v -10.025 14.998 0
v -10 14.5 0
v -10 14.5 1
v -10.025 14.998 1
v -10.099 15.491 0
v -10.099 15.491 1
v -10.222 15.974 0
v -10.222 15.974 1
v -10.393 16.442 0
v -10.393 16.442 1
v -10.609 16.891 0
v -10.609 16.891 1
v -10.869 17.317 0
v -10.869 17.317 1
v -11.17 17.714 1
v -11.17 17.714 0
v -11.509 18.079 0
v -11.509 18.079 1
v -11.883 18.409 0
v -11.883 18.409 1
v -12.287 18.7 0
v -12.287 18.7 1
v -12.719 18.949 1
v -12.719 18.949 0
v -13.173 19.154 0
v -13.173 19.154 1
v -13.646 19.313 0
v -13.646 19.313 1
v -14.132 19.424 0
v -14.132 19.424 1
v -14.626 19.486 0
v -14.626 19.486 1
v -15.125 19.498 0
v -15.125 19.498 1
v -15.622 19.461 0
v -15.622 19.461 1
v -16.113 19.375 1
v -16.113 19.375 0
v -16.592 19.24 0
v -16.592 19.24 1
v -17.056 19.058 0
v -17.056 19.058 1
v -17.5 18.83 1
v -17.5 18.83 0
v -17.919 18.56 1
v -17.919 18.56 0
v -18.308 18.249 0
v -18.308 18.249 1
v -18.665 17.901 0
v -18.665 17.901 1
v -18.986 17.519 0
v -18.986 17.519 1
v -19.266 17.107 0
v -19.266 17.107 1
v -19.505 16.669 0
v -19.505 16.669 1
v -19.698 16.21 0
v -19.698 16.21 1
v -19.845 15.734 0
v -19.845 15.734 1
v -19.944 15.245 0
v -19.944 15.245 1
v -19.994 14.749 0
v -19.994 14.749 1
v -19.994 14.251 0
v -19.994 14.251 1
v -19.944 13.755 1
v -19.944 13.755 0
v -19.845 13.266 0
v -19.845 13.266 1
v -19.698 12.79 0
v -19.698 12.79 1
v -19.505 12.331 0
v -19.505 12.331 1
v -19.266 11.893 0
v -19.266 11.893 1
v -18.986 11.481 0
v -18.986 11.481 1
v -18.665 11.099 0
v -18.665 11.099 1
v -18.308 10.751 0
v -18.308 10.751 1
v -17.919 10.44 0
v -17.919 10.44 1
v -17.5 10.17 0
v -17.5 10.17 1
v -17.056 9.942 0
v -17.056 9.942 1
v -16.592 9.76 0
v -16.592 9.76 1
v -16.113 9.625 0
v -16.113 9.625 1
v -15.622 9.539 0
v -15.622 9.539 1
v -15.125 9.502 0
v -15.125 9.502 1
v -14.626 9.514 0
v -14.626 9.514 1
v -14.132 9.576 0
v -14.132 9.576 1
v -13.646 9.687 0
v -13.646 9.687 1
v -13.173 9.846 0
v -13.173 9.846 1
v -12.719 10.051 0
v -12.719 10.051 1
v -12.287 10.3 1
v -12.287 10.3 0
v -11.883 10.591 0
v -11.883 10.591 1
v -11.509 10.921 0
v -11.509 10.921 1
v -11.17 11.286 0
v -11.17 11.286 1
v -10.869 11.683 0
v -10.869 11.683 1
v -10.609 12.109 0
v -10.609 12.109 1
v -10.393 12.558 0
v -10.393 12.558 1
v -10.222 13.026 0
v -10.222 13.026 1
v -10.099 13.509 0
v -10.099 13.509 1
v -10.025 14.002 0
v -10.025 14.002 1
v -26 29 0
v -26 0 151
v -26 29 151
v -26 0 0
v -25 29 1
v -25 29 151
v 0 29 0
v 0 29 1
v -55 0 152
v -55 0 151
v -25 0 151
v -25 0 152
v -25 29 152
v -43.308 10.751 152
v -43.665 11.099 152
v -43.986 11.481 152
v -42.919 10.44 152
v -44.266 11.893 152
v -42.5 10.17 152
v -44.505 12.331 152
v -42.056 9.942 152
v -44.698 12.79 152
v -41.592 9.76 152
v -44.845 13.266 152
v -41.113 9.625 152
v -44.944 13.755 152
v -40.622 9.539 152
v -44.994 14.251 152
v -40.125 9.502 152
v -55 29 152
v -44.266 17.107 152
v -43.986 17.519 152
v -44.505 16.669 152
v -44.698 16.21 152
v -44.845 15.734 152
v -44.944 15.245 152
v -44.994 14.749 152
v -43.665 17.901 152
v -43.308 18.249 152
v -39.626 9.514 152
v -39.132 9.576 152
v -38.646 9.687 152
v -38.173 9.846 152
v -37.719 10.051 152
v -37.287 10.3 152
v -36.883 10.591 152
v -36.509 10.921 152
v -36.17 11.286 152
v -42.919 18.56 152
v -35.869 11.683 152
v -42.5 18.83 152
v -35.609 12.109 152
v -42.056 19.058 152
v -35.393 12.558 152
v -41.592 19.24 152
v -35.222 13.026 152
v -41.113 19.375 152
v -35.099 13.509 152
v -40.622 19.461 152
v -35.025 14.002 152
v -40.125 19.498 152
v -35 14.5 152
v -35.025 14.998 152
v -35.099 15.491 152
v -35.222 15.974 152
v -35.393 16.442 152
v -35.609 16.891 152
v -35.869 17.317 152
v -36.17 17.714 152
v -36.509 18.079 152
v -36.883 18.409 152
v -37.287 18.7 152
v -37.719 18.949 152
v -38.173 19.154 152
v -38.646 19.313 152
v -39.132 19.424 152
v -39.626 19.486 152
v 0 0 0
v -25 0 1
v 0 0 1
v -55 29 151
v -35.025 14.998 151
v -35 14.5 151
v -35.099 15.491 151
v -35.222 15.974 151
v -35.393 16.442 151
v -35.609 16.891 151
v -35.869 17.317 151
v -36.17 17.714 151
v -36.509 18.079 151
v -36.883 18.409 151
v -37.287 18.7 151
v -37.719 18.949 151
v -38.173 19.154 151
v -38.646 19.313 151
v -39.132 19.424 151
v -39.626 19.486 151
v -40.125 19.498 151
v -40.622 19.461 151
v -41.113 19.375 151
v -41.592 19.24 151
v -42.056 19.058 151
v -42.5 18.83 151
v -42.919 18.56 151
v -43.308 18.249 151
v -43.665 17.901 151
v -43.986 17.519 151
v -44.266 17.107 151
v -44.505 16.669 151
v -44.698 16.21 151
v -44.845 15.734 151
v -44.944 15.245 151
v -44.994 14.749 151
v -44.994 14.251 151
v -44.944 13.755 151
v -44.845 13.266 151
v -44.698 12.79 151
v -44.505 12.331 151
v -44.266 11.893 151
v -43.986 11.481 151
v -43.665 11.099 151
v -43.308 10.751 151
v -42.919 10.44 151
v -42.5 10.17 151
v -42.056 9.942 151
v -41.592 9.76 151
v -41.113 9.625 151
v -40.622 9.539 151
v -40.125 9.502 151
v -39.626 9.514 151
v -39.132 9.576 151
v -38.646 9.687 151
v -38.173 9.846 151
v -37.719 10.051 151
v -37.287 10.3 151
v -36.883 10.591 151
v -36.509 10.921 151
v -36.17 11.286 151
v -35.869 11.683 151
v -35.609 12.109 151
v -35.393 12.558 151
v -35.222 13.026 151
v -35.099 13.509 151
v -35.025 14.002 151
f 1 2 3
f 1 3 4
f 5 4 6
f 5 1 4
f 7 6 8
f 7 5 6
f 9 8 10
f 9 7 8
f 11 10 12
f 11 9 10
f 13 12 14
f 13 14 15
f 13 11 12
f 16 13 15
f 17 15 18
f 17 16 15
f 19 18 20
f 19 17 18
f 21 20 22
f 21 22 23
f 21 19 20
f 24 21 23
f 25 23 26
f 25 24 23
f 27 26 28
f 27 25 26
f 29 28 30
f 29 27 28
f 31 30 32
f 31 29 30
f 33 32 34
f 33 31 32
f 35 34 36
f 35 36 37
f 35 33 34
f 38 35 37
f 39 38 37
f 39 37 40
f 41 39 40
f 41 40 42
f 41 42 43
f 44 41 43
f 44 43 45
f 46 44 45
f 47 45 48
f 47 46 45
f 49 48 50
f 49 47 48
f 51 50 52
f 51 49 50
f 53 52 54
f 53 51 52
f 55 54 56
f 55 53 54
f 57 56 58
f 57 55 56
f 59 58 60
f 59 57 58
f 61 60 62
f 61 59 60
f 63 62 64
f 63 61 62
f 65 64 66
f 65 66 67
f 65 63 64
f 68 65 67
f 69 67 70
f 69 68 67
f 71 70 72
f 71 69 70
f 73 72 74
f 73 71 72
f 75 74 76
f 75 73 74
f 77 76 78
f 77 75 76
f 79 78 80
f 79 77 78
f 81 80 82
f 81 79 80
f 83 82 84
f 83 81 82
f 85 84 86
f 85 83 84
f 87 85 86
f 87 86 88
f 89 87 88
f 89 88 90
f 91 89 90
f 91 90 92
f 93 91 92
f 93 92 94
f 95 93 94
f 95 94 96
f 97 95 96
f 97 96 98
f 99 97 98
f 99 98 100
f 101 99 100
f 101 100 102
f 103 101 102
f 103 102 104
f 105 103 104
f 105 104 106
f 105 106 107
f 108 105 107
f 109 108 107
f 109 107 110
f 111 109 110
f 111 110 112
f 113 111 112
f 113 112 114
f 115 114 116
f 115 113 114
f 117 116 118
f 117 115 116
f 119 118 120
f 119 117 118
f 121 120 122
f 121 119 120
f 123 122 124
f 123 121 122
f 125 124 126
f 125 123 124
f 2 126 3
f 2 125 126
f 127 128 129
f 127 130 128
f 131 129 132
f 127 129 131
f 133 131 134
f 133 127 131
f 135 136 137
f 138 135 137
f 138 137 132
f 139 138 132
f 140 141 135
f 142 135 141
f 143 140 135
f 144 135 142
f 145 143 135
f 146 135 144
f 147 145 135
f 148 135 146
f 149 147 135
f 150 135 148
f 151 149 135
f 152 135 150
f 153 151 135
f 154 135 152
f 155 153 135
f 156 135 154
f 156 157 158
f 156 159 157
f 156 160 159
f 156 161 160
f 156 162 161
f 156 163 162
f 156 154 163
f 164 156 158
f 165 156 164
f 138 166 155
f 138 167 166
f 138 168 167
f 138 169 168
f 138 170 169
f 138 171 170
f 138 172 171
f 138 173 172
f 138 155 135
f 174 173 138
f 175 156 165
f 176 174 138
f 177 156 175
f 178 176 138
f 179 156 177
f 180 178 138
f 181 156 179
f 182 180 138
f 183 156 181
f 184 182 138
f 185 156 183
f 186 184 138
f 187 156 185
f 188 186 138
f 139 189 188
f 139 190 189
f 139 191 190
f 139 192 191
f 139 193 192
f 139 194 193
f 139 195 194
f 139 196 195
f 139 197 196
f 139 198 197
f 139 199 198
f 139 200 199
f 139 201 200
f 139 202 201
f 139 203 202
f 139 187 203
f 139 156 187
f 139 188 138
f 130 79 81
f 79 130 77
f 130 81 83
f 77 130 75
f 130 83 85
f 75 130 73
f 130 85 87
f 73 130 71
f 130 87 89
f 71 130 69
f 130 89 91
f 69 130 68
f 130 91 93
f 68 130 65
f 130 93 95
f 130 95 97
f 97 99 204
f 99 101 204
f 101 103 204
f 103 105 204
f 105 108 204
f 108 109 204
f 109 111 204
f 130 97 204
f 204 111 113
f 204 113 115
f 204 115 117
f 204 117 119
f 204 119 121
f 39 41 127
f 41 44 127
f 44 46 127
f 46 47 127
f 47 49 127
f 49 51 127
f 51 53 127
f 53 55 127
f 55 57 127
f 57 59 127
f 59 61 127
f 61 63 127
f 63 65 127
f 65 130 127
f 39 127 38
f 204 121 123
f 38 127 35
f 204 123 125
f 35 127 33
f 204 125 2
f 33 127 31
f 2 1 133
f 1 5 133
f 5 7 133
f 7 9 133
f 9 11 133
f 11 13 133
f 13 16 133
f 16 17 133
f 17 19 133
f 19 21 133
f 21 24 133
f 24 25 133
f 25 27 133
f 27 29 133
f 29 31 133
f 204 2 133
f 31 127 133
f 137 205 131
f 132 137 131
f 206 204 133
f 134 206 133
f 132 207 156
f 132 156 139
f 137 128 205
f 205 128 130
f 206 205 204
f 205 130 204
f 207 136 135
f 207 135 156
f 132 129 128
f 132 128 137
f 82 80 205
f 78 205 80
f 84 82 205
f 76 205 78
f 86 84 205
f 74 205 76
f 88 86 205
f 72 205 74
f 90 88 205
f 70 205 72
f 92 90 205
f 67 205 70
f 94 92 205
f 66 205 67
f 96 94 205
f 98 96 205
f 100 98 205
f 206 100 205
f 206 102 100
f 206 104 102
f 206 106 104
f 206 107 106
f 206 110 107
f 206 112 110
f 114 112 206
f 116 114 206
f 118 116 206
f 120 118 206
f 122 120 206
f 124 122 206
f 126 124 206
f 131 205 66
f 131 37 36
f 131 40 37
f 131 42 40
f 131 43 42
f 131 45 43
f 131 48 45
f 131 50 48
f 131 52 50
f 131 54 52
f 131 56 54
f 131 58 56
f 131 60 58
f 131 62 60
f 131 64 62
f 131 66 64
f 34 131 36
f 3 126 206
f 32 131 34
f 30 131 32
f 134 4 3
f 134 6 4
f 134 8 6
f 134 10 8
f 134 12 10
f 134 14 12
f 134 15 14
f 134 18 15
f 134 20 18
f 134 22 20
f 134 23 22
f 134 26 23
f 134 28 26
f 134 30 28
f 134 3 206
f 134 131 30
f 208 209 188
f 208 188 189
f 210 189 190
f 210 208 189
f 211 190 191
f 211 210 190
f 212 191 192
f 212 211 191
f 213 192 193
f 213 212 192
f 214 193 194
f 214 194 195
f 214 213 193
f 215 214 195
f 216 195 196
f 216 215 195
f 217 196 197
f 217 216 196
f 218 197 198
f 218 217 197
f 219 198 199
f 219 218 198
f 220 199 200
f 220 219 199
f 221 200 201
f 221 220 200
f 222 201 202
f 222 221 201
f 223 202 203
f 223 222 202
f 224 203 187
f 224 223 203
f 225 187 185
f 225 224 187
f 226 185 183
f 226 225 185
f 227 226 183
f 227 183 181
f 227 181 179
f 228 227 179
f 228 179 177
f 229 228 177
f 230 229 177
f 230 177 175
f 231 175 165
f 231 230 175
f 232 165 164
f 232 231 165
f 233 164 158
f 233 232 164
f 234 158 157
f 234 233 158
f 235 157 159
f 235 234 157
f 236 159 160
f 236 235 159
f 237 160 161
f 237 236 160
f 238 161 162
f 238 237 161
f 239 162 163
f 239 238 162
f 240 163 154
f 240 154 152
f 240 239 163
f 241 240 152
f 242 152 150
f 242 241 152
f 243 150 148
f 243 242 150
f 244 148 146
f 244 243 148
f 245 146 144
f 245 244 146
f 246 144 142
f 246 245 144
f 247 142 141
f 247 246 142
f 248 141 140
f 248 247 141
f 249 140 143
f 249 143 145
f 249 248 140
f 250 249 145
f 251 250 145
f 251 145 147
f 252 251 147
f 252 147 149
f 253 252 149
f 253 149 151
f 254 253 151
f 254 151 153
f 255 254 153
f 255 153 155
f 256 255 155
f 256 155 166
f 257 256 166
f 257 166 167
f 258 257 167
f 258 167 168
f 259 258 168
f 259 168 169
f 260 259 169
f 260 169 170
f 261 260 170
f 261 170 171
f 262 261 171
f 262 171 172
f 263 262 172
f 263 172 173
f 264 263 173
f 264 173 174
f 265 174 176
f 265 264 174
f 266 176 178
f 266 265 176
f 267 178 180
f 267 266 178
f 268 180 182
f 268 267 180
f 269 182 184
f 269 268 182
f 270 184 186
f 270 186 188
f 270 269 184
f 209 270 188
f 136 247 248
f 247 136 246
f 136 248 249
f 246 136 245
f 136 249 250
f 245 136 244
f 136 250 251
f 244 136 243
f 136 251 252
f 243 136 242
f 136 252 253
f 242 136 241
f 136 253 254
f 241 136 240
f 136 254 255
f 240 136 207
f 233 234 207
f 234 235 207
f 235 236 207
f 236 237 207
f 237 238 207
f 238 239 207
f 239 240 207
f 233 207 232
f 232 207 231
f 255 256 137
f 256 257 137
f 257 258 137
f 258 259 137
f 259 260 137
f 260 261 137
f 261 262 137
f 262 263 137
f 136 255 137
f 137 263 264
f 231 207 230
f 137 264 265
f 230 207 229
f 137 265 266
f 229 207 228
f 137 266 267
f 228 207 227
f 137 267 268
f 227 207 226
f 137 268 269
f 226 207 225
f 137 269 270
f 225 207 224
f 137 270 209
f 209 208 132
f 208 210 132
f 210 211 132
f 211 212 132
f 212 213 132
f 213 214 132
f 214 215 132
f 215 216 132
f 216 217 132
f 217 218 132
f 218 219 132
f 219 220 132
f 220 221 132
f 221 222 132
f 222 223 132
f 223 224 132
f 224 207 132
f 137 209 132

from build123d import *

# Parameters (mm, degrees)
SZKIC1_W                    = 26
SZKIC1_H                    = 29
SZKIC1_R                    = 5
DODANIE_WYCI_GNI_CIE1_DEPTH = 1
SZKIC2_W                    = 1
SZKIC2_H                    = 29
DODANIE_WYCI_GNI_CIE2_DEPTH = 150
SZKIC3_W                    = 29
SZKIC3_H                    = 29
SZKIC3_R                    = 5
SZKIC3_W_2                  = 1
DODANIE_WYCI_GNI_CIE3_DEPTH = 1


with BuildPart() as part:
    # Szkic1 → Dodanie-wyciągnięcie1 (new body)
    with BuildSketch(Plane.XY):
        with Locations((-13, 14.5)):
            Rectangle(SZKIC1_W, SZKIC1_H)
        with Locations((-15, 14.5)):
            Circle(SZKIC1_R, mode=Mode.SUBTRACT)
    extrude(amount=DODANIE_WYCI_GNI_CIE1_DEPTH)

    # Szkic2 → Dodanie-wyciągnięcie2 (add)
    with BuildSketch(Plane.XY.offset(1)):
        with Locations((-25.5, 14.5)):
            Rectangle(SZKIC2_W, SZKIC2_H)
    extrude(amount=DODANIE_WYCI_GNI_CIE2_DEPTH)


with BuildPart() as body_2:
    # Szkic3 → Dodanie-wyciągnięcie3 (new body)
    # profile 1 of 2: a face of its own
    with BuildSketch(Plane.XY.offset(151)):
        with Locations((-40.5, 14.5)):
            Rectangle(SZKIC3_W, SZKIC3_H)
        with Locations((-40, 14.5)):
            Circle(SZKIC3_R, mode=Mode.SUBTRACT)
    # profile 2 of 2: a face of its own
    with BuildSketch(Plane.XY.offset(151)):
        with Locations((-25.5, 14.5)):
            Rectangle(SZKIC3_W_2, SZKIC3_H)
    extrude(amount=DODANIE_WYCI_GNI_CIE3_DEPTH)


solid = Compound([part.part, body_2.part])
